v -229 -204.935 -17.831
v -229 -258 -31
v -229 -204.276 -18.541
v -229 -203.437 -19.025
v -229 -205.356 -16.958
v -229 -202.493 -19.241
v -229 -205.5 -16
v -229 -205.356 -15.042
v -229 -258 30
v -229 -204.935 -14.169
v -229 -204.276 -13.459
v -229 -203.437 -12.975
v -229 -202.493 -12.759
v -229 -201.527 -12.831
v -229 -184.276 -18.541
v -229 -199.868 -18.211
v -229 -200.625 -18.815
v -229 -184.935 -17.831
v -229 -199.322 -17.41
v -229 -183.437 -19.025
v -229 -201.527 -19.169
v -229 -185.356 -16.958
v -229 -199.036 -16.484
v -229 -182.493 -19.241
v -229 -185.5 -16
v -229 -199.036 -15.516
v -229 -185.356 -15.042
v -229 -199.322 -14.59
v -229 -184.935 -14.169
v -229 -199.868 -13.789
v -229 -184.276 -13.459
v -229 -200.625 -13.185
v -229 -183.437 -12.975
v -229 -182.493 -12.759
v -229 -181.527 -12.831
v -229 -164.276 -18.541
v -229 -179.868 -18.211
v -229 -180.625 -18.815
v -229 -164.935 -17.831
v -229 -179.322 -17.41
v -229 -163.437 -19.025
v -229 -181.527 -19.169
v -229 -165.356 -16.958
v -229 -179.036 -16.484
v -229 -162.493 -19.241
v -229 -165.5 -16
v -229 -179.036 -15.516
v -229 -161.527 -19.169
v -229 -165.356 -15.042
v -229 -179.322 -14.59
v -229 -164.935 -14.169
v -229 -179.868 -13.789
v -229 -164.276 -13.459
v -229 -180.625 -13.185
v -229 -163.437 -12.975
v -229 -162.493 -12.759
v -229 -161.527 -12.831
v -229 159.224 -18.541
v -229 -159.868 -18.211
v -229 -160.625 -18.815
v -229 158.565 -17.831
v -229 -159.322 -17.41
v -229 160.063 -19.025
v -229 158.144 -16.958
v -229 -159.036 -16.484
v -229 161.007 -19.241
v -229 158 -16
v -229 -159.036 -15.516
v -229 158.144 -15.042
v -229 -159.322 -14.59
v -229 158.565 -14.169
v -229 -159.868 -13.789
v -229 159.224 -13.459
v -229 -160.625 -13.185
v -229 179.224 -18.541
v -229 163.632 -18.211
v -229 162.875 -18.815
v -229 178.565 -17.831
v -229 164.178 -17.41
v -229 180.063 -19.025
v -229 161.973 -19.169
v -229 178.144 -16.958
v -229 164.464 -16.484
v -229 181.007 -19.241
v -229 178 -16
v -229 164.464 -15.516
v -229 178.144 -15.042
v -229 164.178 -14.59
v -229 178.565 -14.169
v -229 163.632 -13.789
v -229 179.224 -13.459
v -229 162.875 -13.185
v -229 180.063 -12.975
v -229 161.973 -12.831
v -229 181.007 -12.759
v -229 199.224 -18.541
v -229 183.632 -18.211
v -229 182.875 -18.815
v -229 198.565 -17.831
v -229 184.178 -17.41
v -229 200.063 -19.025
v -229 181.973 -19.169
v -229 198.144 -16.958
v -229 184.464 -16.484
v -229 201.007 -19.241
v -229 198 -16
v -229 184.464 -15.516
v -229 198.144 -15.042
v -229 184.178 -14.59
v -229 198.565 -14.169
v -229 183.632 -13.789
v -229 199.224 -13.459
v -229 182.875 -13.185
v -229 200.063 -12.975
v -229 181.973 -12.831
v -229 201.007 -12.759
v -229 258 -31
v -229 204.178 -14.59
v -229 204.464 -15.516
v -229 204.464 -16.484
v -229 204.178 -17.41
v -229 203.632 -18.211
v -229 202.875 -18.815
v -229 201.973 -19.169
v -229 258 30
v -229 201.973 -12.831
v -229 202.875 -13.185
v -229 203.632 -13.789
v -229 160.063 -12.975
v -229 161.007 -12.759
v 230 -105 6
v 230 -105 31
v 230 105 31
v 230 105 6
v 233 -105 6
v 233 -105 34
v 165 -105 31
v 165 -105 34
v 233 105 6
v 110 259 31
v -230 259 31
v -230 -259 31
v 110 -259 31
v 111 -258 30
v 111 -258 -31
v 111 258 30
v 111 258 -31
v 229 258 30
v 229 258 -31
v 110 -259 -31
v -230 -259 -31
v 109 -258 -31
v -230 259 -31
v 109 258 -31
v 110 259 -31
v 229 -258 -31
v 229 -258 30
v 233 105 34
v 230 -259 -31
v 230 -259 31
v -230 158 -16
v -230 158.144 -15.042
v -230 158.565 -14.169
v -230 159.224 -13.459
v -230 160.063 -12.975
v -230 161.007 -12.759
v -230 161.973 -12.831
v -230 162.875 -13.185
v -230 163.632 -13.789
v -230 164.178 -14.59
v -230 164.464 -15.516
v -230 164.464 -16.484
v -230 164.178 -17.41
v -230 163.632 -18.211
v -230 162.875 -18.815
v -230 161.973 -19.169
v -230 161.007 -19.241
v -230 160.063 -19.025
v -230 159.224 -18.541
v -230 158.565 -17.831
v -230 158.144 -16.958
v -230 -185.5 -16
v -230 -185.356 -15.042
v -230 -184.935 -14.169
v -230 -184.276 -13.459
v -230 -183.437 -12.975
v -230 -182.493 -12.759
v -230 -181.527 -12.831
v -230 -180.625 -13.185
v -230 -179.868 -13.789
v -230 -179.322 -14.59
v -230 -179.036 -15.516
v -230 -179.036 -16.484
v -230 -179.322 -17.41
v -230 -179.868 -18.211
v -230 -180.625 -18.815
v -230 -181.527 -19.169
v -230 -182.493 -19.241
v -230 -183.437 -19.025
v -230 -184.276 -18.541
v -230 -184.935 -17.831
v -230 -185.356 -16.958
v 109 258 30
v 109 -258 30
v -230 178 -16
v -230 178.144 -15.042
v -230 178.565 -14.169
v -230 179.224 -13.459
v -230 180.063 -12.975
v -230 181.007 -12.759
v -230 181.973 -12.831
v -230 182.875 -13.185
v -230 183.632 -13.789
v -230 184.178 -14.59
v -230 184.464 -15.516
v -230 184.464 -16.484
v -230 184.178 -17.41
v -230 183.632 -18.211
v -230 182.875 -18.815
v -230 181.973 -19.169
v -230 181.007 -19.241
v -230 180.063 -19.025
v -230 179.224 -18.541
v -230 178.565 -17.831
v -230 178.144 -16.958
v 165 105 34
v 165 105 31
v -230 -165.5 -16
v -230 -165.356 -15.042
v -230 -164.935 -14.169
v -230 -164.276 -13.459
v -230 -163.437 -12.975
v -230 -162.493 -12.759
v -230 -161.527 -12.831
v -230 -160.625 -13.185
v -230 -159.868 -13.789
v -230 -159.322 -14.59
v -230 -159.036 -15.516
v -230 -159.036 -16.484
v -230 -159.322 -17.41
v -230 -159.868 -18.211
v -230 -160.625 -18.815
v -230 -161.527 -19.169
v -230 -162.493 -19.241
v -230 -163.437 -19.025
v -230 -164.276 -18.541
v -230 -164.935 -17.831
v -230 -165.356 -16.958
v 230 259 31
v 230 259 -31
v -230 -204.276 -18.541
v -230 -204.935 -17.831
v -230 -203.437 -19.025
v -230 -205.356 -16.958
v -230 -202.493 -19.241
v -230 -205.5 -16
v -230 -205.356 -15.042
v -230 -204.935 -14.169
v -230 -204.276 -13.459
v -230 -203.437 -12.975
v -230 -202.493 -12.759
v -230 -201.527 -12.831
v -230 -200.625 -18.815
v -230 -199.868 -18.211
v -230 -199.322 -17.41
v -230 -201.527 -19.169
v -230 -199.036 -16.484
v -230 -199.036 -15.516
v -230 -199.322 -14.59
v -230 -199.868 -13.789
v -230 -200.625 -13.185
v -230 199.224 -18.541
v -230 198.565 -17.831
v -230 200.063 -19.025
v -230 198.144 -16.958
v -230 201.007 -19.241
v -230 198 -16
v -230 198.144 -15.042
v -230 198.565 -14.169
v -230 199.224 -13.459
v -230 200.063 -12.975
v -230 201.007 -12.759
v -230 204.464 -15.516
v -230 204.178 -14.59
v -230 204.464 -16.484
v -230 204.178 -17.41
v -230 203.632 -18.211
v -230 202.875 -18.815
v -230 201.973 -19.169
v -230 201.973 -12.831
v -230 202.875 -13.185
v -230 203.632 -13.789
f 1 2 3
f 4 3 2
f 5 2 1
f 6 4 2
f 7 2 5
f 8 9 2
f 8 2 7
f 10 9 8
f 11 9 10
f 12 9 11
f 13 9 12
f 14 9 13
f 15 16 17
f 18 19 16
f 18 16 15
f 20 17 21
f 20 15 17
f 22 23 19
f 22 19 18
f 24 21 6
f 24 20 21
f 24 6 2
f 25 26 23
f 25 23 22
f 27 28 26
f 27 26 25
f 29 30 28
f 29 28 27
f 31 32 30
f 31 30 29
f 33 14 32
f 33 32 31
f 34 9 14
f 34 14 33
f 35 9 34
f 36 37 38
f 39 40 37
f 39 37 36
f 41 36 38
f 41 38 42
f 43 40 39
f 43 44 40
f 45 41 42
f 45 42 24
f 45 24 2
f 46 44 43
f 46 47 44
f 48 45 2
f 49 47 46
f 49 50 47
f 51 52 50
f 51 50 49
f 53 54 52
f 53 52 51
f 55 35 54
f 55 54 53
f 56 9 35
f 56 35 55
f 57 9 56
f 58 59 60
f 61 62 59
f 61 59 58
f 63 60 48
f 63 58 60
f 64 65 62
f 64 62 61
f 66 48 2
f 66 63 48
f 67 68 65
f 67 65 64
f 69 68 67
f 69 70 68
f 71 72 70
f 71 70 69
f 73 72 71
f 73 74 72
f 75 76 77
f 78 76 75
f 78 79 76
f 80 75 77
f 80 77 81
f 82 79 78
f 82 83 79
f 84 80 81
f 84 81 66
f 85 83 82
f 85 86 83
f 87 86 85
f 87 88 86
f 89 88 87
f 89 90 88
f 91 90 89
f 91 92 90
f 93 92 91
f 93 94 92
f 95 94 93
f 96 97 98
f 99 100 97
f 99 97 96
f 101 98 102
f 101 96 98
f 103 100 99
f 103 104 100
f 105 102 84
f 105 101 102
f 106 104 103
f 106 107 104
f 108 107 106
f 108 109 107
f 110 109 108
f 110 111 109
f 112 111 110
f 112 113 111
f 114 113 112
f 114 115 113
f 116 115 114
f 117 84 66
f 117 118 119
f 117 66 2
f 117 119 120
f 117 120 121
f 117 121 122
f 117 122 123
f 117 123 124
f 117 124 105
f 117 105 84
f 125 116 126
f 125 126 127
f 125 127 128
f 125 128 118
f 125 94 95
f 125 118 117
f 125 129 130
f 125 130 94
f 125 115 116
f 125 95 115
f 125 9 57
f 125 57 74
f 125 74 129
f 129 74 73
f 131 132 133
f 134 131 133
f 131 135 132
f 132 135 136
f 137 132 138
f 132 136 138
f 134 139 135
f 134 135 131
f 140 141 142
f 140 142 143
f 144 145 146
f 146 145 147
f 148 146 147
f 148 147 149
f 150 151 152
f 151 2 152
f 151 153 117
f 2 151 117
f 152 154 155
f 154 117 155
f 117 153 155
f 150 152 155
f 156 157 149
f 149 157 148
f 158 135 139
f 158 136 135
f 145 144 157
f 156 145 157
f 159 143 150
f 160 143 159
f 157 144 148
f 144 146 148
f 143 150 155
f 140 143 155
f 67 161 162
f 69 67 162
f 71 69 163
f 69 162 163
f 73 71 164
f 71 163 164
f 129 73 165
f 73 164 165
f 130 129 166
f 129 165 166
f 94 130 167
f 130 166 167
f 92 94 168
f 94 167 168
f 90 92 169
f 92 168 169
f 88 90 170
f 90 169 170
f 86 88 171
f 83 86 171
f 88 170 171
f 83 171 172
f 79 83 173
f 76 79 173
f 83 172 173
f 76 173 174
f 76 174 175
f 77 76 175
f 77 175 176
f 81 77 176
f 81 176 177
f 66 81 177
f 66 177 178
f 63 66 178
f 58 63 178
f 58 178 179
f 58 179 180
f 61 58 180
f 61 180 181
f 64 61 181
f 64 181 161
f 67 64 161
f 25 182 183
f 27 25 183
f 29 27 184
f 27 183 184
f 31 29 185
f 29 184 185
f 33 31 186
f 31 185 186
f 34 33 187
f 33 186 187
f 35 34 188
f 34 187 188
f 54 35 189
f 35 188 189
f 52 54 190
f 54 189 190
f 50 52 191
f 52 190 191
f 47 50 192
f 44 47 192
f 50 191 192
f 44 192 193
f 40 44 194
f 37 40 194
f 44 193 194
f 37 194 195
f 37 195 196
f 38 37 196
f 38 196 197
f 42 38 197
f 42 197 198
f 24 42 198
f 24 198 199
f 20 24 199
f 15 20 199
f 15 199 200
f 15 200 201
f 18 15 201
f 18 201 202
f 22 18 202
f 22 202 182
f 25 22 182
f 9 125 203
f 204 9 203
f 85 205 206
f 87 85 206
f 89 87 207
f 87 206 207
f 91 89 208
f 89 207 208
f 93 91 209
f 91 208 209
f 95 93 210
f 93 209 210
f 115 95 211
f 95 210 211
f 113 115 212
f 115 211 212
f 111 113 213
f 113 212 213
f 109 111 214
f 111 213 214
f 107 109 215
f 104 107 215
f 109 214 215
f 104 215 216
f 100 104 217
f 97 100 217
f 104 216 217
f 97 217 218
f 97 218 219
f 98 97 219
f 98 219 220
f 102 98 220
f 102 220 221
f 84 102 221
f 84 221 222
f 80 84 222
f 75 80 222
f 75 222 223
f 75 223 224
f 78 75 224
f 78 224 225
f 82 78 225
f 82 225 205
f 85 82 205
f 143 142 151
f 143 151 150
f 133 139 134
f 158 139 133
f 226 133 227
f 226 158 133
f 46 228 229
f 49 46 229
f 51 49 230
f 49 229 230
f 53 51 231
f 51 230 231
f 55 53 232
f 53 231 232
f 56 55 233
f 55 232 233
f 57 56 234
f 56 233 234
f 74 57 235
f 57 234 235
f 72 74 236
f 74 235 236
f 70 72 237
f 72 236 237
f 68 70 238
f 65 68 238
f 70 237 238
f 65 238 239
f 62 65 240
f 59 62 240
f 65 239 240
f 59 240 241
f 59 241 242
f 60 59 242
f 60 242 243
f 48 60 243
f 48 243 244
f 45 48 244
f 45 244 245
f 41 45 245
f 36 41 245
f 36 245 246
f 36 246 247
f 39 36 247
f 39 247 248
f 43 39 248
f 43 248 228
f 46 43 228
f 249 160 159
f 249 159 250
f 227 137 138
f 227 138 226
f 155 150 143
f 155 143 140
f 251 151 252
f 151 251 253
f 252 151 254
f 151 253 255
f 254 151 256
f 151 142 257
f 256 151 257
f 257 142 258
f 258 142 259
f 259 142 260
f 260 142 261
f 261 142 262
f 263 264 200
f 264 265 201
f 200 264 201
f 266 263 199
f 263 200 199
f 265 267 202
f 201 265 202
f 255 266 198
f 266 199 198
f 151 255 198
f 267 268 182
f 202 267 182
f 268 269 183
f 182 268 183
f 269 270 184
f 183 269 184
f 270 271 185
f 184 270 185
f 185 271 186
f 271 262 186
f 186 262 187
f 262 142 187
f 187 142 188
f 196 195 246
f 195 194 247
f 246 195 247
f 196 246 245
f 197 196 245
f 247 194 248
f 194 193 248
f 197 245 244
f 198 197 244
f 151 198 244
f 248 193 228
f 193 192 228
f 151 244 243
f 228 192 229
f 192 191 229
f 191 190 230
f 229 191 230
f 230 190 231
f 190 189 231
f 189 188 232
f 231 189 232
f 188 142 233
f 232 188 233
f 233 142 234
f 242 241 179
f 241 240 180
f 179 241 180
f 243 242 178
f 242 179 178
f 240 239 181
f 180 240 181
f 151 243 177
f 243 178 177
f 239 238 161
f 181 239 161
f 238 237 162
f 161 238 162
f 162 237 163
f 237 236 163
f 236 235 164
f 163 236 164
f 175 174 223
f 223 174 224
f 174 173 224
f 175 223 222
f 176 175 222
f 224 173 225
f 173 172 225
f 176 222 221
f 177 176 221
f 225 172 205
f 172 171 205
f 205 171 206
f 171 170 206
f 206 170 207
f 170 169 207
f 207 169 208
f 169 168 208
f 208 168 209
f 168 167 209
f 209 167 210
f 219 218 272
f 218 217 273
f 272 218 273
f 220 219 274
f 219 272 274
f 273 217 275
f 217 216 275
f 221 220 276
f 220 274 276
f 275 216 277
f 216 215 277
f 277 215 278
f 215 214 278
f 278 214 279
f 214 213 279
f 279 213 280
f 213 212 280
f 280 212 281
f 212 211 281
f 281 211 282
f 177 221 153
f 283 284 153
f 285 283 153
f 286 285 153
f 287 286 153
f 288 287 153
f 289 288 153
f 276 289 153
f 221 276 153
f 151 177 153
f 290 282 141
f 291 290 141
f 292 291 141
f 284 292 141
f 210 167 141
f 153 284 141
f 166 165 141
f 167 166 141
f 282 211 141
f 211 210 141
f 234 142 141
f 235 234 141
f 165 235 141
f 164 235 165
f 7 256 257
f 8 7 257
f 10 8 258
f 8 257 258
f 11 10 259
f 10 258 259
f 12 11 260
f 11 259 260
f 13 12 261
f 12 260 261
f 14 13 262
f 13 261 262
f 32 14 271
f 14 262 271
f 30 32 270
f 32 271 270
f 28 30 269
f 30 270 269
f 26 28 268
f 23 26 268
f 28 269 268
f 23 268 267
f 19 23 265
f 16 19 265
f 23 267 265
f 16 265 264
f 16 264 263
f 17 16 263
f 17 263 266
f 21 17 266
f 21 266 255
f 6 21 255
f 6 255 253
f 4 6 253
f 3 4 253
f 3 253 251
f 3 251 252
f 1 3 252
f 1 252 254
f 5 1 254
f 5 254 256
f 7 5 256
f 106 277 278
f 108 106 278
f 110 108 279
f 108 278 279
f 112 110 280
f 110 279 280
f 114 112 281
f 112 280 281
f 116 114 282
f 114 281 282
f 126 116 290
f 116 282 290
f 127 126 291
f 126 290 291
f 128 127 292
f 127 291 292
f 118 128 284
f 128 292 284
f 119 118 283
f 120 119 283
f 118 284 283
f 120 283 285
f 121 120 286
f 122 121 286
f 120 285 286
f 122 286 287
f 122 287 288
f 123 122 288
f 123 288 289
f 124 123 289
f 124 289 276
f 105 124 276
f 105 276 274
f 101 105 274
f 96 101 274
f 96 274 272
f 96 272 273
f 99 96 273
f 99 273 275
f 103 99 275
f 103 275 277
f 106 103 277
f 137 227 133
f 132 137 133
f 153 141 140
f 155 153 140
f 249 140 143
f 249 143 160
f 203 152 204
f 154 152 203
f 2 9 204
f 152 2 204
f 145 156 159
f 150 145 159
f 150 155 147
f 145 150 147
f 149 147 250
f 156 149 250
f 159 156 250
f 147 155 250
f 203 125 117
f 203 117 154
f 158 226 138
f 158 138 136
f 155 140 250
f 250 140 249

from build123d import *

# Parameters (mm, degrees)
SKETCH1_W              = 460
SKETCH1_H              = 518
BOSS_EXTRUDE1_DEPTH    = 31
SPLIT1_SURFACE_1_BACK  = 696.534
SPLIT1_SURFACE_1_DEPTH = 1393.068
SPLIT1_SURFACE_2_BACK  = 696.534
SPLIT1_SURFACE_2_DEPTH = 1393.068
SKETCH3_W              = 68
SKETCH3_H              = 210
BOSS_EXTRUDE2_DEPTH    = 3
SKETCH4_W              = 3
SKETCH4_H              = 210
BOSS_EXTRUDE3_DEPTH    = 25
SHELL1_T               = -1
SHELL2_T               = -1
SKETCH6_R              = 3.25
CUT_EXTRUDE2_DEPTH     = 5


with BuildPart() as part:
    # Sketch1 → Boss-Extrude1 (new, symmetric)
    with BuildSketch(Plane.XY):
        Rectangle(SKETCH1_W, SKETCH1_H)
    extrude(amount=BOSS_EXTRUDE1_DEPTH, both=True)


with BuildPart() as body_2:
    # Split1: the piece behind the surface
    add(part.part)
    # Split1 surface: a surface, the sketch's curves swept straight by 1393.068 mm
    with BuildLine(Plane.XY.offset(31).offset(-SPLIT1_SURFACE_1_BACK), mode=Mode.PRIVATE) as split1_surface_1_path:
        Line((110, -259), (110, 259))
    split1_surface_1 = Shell.extrude(split1_surface_1_path.wire(), (0 * SPLIT1_SURFACE_1_DEPTH, 0 * SPLIT1_SURFACE_1_DEPTH, 1 * SPLIT1_SURFACE_1_DEPTH))
    split(bisect_by=split1_surface_1, keep=Keep.BOTTOM)

    # Shell2
    shell2_openings = [body_2.faces().sort_by_distance(p)[0] for p in [
        (170, 0, -31),
    ]]
    offset(amount=SHELL2_T, openings=shell2_openings, kind=Kind.INTERSECTION)


with BuildPart() as part_1:
    add(part.part)

    # Split1: split by a surface, the side it looks to stays
    # Split1 surface: a surface, the sketch's curves swept straight by 1393.068 mm
    with BuildLine(Plane.XY.offset(31).offset(-SPLIT1_SURFACE_2_BACK), mode=Mode.PRIVATE) as split1_surface_2_path:
        Line((110, -259), (110, 259))
    split1_surface_2 = Shell.extrude(split1_surface_2_path.wire(), (0 * SPLIT1_SURFACE_2_DEPTH, 0 * SPLIT1_SURFACE_2_DEPTH, 1 * SPLIT1_SURFACE_2_DEPTH))
    split(bisect_by=split1_surface_2, keep=Keep.TOP)

    # Shell1
    shell1_openings = [part_1.faces().sort_by_distance(p)[0] for p in [
        (-60, 0, -31),
    ]]
    offset(amount=SHELL1_T, openings=shell1_openings, kind=Kind.INTERSECTION)

    # Sketch6 → Cut-Extrude2 (cut)
    with BuildSketch(Plane.ZY.offset(230)):
        with Locations(Location((-16, 201.25, 0), (0, 0, 270))):
            Circle(SKETCH6_R)
        with Locations(Location((-16, 181.25, 0), (0, 0, 270))):
            Circle(SKETCH6_R)
        with Locations(Location((-16, 161.25, 0), (0, 0, 270))):
            Circle(SKETCH6_R)
        with Locations(Location((-16, -162.25, 0), (0, 0, 270))):
            Circle(SKETCH6_R)
        with Locations(Location((-16, -182.25, 0), (0, 0, 270))):
            Circle(SKETCH6_R)
        with Locations(Location((-16, -202.25, 0), (0, 0, 270))):
            Circle(SKETCH6_R)
    extrude(amount=-CUT_EXTRUDE2_DEPTH, mode=Mode.SUBTRACT)


with BuildPart() as body_3:
    # Sketch3 → Boss-Extrude2 (new body)
    with BuildSketch(Plane.XY.offset(31)):
        with Locations((199, 0)):
            Rectangle(SKETCH3_W, SKETCH3_H)
    extrude(amount=BOSS_EXTRUDE2_DEPTH)


with BuildPart() as body_4:
    # Sketch4 → Boss-Extrude3 (new body)
    with BuildSketch(Plane(origin=(0, 0, 31), x_dir=(-1, 0, 0), z_dir=(0, 0, -1))):
        with Locations((-231.5, 0)):
            Rectangle(SKETCH4_W, SKETCH4_H)
    extrude(amount=BOSS_EXTRUDE3_DEPTH)


with BuildPart() as body_3_1:
    add(body_3.part)

    # Combine1: union body 4
    add(body_4.part)


solid = Compound([body_2.part, part_1.part, body_3_1.part])
